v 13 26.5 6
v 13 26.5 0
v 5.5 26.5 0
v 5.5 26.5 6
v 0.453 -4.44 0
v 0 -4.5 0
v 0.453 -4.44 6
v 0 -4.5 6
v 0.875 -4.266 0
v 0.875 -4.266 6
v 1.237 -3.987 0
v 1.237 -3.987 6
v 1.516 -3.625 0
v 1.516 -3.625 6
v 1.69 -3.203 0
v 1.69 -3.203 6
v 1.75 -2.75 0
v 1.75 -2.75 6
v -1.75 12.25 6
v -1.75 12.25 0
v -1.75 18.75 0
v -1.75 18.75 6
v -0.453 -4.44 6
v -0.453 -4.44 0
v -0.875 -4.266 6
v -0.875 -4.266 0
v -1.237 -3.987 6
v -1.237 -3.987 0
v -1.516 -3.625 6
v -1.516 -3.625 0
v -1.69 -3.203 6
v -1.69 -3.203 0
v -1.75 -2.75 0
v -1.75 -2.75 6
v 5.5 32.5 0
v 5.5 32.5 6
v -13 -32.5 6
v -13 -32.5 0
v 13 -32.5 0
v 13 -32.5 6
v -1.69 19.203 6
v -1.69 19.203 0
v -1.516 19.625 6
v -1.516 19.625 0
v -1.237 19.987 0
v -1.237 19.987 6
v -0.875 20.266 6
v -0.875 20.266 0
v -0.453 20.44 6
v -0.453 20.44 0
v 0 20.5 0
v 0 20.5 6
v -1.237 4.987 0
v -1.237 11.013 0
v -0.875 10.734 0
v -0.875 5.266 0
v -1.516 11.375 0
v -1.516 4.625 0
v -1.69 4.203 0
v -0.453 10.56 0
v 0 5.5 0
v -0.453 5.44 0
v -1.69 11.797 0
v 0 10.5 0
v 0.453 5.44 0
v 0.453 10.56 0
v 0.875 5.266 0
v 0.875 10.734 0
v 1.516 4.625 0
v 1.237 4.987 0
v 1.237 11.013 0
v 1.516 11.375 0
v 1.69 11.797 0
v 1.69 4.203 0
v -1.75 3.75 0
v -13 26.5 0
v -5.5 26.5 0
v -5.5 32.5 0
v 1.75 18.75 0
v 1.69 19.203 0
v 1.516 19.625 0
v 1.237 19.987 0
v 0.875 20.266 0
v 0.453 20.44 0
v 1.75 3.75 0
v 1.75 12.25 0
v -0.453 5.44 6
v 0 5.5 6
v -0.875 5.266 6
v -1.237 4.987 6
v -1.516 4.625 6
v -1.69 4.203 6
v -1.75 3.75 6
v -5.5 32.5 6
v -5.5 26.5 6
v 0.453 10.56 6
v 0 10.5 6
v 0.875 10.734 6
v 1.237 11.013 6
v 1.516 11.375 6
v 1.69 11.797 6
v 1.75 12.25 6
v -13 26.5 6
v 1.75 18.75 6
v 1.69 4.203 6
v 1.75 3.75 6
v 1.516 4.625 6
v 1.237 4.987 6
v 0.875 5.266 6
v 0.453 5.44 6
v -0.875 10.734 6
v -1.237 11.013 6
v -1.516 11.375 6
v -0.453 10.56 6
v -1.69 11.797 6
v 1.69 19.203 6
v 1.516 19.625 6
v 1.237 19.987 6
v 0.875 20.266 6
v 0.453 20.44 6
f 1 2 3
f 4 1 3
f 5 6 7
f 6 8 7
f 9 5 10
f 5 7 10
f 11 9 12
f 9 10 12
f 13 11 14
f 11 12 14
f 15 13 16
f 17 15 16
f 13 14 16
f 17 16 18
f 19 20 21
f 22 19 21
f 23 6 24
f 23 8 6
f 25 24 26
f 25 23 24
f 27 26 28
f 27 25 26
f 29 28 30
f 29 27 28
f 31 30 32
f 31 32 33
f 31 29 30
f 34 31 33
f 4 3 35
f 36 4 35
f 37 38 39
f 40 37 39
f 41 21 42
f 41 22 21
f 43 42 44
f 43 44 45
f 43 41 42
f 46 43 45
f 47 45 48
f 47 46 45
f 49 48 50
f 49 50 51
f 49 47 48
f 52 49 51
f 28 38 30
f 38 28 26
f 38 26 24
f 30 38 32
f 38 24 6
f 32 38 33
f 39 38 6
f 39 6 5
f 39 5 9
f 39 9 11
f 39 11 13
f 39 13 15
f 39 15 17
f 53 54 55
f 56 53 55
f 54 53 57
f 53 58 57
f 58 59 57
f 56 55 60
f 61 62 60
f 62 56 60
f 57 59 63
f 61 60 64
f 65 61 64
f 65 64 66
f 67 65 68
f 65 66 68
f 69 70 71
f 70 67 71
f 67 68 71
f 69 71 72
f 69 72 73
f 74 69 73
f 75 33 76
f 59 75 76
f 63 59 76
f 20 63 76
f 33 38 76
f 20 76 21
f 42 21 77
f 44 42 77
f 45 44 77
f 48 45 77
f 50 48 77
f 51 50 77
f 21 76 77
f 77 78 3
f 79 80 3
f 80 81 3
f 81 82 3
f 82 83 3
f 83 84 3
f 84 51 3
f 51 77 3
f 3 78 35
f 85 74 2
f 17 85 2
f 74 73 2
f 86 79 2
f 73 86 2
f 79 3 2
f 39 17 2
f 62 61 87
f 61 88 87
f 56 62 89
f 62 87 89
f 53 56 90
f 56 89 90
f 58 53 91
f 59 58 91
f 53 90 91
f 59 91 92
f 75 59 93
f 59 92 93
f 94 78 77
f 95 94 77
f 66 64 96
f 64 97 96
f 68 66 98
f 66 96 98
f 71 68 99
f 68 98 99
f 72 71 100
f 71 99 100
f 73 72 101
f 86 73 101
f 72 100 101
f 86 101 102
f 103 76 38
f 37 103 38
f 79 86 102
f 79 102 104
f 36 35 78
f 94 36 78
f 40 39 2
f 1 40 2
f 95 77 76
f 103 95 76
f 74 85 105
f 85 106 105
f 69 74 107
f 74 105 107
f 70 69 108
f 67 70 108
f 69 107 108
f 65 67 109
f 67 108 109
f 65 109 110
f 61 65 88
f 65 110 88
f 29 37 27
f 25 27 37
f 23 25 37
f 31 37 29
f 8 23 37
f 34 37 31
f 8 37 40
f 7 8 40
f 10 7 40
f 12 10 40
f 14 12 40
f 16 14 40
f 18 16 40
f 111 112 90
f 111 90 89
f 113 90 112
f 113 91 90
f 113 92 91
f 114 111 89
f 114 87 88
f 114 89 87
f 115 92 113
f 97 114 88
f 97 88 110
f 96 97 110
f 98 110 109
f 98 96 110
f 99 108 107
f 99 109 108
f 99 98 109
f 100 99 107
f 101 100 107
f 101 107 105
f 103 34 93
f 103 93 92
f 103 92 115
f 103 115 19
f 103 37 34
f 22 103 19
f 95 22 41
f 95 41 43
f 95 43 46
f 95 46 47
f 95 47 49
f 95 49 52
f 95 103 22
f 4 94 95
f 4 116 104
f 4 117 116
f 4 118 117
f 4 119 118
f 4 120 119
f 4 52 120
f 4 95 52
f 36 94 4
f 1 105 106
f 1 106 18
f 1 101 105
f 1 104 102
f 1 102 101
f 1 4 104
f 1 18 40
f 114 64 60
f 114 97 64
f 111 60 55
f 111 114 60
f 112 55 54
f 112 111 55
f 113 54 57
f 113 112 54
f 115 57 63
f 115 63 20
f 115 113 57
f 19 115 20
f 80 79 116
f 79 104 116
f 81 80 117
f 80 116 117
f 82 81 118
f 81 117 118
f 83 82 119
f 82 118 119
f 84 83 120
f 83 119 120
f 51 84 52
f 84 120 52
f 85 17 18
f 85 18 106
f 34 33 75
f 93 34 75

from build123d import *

# Parameters (mm, degrees)
ESBO_O1_W                = 3.5
ESBO_O1_H                = 10
RESSALTO_EXTRUS_O1_DEPTH = 6
FILETE1_R                = 1.75


with BuildPart() as part:
    # Esboço1 → Ressalto-extrusão1 (new body)
    with BuildSketch(Plane.XY):
        Polygon((5.5, 32.5), (0, 32.5), (-5.5, 32.5), (-5.5, 26.5), (-13, 26.5), (-13, -32.5), (13, -32.5), (13, 26.5), (5.5, 26.5), align=None)
        with Locations((0, 15.5)):
            Rectangle(ESBO_O1_W, ESBO_O1_H, mode=Mode.SUBTRACT)
        with Locations((0, 0.5)):
            Rectangle(ESBO_O1_W, ESBO_O1_H, mode=Mode.SUBTRACT)
    extrude(amount=RESSALTO_EXTRUS_O1_DEPTH)

    # Filete1
    filete1_edges = [part.edges().sort_by_distance(p)[0] for p in [
        (-1.75, -4.5, 3),
        (1.75, -4.5, 3),
        (1.75, 5.5, 3),
        (-1.75, 5.5, 3),
        (1.75, 10.5, 3),
        (-1.75, 10.5, 3),
        (1.75, 20.5, 3),
        (-1.75, 20.5, 3),
    ]]
    fillet(filete1_edges, radius=FILETE1_R - 0.0001)  # a hair under: the kernel refuses the full size


solid = part.part
